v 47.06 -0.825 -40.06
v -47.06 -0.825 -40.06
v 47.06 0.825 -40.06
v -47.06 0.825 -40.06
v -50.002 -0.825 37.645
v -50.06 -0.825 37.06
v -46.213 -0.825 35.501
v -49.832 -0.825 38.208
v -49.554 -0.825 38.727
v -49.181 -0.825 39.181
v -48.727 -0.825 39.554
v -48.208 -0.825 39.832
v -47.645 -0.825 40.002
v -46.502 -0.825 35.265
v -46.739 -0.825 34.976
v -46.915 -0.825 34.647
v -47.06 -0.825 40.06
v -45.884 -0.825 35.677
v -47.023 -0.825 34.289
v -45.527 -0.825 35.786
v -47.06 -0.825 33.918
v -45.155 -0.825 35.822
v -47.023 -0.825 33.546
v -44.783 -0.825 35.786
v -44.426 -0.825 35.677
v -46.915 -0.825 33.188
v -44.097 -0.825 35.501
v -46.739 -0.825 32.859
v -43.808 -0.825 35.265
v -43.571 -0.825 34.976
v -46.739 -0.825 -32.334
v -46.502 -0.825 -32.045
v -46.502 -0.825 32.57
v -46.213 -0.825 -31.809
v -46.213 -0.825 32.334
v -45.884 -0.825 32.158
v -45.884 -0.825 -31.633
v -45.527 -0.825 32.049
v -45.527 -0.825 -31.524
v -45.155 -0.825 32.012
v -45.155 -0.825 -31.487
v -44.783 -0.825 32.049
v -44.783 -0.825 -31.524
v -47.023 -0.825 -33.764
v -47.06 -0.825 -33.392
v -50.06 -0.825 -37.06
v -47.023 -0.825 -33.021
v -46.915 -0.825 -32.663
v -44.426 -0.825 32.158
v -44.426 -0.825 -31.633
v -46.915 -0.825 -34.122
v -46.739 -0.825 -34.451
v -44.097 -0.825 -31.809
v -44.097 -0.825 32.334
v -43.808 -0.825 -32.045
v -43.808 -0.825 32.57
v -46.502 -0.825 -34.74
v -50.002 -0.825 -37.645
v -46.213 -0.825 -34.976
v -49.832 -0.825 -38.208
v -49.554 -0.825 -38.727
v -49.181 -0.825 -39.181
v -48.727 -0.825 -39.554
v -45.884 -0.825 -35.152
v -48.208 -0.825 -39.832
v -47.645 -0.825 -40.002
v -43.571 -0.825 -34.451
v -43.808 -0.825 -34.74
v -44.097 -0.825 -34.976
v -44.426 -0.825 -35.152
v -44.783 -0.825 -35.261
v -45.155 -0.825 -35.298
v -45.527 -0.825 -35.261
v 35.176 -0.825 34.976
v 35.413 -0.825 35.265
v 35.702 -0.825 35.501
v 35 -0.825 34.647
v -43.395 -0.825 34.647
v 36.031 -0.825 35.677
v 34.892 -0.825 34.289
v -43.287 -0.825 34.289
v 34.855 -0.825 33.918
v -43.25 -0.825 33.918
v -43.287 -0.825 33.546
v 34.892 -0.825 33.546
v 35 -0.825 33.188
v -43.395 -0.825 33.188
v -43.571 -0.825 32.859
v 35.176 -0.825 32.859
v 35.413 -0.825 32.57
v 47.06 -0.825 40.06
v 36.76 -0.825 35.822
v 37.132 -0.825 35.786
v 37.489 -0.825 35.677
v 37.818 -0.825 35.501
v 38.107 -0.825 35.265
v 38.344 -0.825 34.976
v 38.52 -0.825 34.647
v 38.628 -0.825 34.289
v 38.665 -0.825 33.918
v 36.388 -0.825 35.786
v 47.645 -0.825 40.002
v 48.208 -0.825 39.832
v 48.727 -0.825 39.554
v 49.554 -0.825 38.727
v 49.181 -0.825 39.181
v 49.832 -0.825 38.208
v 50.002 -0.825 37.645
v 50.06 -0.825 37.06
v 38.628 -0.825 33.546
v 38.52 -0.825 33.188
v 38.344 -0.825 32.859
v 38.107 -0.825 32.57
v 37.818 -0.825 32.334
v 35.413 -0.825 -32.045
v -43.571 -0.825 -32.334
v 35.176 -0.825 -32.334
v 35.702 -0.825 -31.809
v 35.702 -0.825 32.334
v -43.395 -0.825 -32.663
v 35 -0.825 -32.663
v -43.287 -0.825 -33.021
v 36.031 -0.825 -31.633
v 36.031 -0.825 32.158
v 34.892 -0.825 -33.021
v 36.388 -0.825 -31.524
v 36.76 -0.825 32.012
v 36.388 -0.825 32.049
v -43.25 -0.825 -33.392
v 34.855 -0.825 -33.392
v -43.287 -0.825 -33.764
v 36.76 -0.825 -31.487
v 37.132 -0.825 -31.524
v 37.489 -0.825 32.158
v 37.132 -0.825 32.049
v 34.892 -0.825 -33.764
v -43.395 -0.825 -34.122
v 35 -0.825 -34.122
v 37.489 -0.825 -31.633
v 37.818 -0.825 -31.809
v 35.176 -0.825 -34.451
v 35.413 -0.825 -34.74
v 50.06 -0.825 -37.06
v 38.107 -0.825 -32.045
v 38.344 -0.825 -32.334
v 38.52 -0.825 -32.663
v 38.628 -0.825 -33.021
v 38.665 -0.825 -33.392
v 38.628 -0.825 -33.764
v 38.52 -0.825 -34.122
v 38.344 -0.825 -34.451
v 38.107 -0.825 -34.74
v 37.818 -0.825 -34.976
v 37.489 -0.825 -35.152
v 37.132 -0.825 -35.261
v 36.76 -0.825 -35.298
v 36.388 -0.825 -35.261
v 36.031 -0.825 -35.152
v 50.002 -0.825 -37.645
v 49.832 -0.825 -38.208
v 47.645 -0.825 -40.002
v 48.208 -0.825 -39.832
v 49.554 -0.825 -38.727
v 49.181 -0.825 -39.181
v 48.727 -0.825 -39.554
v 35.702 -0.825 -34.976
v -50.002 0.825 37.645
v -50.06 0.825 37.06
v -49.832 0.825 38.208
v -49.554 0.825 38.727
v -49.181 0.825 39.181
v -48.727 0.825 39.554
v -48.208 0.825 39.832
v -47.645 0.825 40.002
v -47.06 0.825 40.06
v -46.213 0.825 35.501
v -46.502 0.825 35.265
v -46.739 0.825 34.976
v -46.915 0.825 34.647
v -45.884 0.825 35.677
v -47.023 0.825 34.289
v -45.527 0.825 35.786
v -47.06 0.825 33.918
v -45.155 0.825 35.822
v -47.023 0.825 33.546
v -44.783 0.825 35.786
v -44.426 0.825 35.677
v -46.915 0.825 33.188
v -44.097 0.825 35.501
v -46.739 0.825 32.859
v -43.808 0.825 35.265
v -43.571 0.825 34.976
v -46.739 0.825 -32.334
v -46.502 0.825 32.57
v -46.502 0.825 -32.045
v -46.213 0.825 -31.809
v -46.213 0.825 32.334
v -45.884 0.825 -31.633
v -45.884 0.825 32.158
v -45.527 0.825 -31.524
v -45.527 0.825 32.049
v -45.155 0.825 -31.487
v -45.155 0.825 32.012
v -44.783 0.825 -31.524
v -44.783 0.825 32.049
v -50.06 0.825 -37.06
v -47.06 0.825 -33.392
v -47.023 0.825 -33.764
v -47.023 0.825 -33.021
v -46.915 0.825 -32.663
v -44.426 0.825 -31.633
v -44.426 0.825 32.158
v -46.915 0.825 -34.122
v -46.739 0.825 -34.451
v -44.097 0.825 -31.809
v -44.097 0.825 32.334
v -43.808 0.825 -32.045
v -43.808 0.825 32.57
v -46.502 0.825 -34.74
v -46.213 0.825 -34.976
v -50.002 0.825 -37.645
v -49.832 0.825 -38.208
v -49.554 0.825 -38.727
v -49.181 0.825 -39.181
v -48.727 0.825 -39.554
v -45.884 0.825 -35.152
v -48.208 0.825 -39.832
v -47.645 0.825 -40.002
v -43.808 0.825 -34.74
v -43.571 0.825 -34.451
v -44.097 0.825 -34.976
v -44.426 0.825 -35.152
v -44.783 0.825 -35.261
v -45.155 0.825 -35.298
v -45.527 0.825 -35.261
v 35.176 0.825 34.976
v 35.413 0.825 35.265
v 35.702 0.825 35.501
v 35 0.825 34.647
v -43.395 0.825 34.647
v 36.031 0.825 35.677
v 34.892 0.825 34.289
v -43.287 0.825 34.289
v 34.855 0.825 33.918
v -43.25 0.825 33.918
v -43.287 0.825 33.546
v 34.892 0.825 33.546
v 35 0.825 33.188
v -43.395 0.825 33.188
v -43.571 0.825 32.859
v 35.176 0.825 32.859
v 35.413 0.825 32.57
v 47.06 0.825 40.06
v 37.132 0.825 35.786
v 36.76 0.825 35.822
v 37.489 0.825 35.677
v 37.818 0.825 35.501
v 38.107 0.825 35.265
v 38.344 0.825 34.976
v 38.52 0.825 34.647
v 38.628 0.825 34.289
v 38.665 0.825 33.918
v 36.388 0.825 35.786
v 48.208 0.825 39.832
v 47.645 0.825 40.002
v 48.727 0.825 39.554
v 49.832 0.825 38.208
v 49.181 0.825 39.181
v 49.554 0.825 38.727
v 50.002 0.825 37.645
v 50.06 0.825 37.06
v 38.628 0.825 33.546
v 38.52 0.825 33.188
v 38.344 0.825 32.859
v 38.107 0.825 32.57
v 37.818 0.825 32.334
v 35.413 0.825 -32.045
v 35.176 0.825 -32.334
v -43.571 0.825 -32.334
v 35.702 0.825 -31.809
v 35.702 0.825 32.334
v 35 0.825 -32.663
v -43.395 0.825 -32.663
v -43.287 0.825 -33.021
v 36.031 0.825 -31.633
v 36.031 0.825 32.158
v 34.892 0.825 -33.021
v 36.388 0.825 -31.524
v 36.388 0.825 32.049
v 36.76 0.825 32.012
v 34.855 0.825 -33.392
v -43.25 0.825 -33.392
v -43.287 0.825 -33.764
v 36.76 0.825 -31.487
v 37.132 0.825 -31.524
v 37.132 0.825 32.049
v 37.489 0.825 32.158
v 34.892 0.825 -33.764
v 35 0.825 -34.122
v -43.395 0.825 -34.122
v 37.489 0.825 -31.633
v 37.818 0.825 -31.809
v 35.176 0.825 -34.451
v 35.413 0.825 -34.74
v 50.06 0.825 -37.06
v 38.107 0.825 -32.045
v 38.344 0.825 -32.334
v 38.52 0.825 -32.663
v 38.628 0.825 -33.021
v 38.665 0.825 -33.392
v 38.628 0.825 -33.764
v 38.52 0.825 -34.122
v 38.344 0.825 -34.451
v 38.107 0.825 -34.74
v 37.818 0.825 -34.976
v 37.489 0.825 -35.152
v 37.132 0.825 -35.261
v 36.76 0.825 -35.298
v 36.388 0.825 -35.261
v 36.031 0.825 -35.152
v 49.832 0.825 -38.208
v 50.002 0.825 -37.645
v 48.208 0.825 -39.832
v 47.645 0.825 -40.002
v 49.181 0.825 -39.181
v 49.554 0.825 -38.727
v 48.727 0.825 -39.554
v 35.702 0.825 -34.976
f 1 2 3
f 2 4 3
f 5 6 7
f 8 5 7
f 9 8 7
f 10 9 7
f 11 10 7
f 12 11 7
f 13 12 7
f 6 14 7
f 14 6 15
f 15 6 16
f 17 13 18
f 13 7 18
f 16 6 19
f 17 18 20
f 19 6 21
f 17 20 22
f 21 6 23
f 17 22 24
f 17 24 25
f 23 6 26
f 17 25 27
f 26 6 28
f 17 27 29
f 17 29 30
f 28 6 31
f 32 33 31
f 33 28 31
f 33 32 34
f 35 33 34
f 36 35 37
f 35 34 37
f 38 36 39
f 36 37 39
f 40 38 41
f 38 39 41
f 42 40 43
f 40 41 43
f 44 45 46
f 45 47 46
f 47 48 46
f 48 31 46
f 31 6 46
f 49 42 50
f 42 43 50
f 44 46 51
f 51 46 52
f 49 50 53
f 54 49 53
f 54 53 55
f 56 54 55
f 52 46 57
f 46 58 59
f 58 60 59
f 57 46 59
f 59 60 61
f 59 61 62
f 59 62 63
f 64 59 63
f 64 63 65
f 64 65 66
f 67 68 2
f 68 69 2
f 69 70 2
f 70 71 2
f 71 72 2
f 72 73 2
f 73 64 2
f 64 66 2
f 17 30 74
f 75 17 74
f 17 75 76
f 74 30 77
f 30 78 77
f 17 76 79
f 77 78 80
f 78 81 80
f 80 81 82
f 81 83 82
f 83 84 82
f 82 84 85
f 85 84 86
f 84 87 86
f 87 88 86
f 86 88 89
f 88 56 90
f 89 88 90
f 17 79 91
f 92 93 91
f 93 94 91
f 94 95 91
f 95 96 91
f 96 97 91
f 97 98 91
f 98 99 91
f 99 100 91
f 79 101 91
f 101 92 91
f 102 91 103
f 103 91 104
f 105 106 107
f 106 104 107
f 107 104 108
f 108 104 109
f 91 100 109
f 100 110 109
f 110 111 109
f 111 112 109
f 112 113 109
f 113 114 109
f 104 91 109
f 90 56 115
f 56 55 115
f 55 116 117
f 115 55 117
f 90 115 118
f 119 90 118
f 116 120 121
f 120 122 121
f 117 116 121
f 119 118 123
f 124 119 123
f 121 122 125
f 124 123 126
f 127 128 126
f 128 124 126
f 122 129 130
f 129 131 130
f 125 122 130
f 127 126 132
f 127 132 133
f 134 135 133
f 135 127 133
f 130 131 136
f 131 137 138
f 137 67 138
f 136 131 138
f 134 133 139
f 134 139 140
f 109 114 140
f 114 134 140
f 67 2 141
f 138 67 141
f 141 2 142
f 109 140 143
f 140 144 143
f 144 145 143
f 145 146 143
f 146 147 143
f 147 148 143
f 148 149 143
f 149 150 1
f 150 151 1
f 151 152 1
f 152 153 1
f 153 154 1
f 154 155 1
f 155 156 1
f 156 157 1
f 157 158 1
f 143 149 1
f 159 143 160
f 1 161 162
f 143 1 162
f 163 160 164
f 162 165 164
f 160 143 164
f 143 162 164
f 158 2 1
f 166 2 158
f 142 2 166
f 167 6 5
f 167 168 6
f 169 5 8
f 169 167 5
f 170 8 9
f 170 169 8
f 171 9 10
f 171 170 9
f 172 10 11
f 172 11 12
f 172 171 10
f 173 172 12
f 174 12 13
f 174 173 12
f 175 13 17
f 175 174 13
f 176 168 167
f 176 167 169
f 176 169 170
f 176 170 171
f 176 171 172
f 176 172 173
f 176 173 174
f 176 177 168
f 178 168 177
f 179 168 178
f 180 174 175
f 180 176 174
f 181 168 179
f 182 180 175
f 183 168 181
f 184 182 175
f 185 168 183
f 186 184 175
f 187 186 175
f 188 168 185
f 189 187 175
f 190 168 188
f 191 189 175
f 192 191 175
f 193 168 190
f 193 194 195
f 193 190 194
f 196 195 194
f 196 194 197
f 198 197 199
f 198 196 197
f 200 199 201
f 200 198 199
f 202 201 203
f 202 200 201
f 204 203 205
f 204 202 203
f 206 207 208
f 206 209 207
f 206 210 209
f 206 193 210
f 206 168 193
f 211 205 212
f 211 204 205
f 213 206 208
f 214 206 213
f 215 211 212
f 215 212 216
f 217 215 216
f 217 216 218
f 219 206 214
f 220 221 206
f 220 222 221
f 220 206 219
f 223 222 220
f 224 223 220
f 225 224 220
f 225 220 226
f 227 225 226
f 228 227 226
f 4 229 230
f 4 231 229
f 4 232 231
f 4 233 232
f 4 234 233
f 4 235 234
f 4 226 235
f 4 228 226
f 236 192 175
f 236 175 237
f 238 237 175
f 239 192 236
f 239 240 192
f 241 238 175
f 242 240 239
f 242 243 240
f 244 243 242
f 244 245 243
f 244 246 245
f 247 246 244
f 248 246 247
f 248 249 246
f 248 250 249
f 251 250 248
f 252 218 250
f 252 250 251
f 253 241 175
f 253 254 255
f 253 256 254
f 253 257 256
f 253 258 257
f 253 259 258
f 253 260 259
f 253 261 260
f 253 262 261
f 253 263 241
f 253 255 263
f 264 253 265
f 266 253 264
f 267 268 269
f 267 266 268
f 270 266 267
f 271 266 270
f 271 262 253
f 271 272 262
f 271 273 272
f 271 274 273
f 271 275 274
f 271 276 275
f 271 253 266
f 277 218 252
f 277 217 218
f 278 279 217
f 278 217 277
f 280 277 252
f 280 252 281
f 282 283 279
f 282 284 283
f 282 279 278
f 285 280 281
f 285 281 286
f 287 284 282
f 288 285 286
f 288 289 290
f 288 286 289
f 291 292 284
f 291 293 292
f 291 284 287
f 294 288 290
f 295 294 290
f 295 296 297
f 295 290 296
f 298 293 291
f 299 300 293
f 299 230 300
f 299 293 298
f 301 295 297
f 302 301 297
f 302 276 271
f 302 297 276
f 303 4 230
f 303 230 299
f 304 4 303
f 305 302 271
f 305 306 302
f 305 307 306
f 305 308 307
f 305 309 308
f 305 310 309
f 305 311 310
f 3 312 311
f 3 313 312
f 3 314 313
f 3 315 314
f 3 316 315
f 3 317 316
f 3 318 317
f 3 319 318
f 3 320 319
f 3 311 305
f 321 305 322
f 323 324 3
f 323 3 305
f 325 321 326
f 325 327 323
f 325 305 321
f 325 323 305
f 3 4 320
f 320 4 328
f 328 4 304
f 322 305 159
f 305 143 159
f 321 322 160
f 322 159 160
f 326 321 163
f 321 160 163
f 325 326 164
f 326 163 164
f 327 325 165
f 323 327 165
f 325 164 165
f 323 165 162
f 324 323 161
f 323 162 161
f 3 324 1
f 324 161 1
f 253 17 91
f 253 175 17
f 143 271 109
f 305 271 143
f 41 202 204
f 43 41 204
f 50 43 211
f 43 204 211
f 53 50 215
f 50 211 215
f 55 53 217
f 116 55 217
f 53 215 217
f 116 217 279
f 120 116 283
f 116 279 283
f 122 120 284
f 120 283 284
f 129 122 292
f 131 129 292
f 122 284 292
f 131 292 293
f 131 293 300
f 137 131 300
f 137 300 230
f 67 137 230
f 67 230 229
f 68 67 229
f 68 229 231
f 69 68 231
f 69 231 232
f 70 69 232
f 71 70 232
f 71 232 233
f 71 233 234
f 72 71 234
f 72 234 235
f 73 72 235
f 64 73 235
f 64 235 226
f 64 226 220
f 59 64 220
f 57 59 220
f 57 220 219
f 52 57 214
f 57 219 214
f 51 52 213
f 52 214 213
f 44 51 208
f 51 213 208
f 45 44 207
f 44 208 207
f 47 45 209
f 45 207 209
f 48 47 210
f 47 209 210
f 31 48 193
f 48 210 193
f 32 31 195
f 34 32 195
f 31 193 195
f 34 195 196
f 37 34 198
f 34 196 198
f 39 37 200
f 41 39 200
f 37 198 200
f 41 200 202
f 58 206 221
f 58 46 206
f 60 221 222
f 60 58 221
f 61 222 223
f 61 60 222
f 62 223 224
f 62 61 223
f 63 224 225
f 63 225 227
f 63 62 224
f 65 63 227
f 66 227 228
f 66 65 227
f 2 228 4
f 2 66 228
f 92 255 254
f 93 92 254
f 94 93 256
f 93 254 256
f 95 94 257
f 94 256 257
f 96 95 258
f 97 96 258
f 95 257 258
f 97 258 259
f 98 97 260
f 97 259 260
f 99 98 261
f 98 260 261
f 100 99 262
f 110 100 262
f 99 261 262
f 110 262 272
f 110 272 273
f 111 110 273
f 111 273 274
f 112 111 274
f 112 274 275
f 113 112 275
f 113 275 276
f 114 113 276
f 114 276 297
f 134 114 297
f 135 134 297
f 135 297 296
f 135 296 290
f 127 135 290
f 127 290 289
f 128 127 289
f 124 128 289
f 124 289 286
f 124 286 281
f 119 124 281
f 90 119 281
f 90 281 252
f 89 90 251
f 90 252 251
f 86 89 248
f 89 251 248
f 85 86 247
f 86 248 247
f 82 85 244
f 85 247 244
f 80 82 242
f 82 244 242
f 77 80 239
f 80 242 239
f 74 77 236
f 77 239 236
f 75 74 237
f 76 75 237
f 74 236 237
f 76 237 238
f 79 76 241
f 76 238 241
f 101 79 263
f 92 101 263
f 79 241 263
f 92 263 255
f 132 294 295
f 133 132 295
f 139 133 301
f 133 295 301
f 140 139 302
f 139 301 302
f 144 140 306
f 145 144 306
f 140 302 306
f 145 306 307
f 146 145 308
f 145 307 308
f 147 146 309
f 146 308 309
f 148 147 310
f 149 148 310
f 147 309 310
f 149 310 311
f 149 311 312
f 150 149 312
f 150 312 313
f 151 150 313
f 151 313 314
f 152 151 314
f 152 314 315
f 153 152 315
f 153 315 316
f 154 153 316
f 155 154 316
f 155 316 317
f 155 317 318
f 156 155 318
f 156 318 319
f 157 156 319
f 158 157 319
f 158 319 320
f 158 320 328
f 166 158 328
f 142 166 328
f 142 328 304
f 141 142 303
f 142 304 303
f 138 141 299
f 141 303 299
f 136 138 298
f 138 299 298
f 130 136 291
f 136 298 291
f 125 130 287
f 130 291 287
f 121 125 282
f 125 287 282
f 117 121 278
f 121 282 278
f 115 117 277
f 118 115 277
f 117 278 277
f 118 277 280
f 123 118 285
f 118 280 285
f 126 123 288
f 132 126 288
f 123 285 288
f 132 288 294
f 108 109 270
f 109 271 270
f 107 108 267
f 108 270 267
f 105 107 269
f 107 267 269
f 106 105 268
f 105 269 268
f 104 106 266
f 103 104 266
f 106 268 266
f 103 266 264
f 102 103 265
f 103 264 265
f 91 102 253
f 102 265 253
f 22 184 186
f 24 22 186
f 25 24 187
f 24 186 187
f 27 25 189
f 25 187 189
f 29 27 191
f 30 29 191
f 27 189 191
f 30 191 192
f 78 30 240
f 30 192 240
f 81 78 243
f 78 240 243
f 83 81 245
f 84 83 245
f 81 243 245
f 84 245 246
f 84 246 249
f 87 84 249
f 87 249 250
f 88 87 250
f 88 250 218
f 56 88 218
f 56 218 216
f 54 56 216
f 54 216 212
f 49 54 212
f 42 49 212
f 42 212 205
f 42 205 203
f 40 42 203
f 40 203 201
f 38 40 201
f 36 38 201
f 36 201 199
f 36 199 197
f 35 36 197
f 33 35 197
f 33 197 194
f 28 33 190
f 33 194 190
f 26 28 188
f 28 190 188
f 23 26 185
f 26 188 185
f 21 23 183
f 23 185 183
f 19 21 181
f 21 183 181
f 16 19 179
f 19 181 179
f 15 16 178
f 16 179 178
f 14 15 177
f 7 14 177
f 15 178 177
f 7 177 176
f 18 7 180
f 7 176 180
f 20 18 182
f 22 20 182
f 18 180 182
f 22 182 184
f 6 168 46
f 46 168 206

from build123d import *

# Parameters (mm, degrees)
SKETCH1_W           = 100.12
SKETCH1_H           = 80.12
BOSS_EXTRUDE1_DEPTH = 0.825
FILLET1_R           = 3
CUT_EXTRUDE1_REACH  = 66.137
SKETCH2_R           = 1.905


with BuildPart() as part:
    # Sketch1 → Boss-Extrude1 (new, symmetric)
    with BuildSketch(Plane(origin=(0, 0, 0), x_dir=(1, 0, 0), z_dir=(0, 1, 0))):
        Rectangle(SKETCH1_W, SKETCH1_H)
    extrude(amount=BOSS_EXTRUDE1_DEPTH, both=True)

    # Fillet1
    fillet1_edges = [part.edges().sort_by_distance(p)[0] for p in [
        (-50.06, 0, -40.06),
        (50.06, 0, -40.06),
        (50.06, 0, 40.06),
        (-50.06, 0, 40.06),
    ]]
    fillet(fillet1_edges, radius=FILLET1_R)

    # Sketch2 → Cut-Extrude1 (cut, up to next)
    with BuildSketch(Plane(origin=(0, 0.825, 0), x_dir=(1, 0, 0), z_dir=(0, 1, 0)), mode=Mode.PRIVATE) as cut_extrude1_sk1:
        with Locations(Location((-45.155, 33.3925, 0), (0, 0, 270))):
            Circle(SKETCH2_R)
    cut_extrude1_tool1 = extrude(cut_extrude1_sk1.sketch, amount=-CUT_EXTRUDE1_REACH, mode=Mode.PRIVATE) & part.part
    # Sketch2 → Cut-Extrude1 (cut, up to next)
    with BuildSketch(Plane(origin=(0, 0.825, 0), x_dir=(1, 0, 0), z_dir=(0, 1, 0)), mode=Mode.PRIVATE) as cut_extrude1_sk2:
        with Locations(Location((-45.155, -33.9175, 0), (0, 0, 270))):
            Circle(SKETCH2_R)
    cut_extrude1_tool2 = extrude(cut_extrude1_sk2.sketch, amount=-CUT_EXTRUDE1_REACH, mode=Mode.PRIVATE) & part.part
    # Sketch2 → Cut-Extrude1 (cut, up to next)
    with BuildSketch(Plane(origin=(0, 0.825, 0), x_dir=(1, 0, 0), z_dir=(0, 1, 0)), mode=Mode.PRIVATE) as cut_extrude1_sk3:
        with Locations(Location((36.76, -33.9175, 0), (0, 0, 270))):
            Circle(SKETCH2_R)
    cut_extrude1_tool3 = extrude(cut_extrude1_sk3.sketch, amount=-CUT_EXTRUDE1_REACH, mode=Mode.PRIVATE) & part.part
    # Sketch2 → Cut-Extrude1 (cut, up to next)
    with BuildSketch(Plane(origin=(0, 0.825, 0), x_dir=(1, 0, 0), z_dir=(0, 1, 0)), mode=Mode.PRIVATE) as cut_extrude1_sk4:
        with Locations(Location((36.76, 33.3925, 0), (0, 0, 270))):
            Circle(SKETCH2_R)
    cut_extrude1_tool4 = extrude(cut_extrude1_sk4.sketch, amount=-CUT_EXTRUDE1_REACH, mode=Mode.PRIVATE) & part.part
    add(cut_extrude1_tool1.solids().sort_by_distance((-45.155, 0.825, -33.3925))[0], mode=Mode.SUBTRACT)
    add(cut_extrude1_tool2.solids().sort_by_distance((-45.155, 0.825, 33.9175))[0], mode=Mode.SUBTRACT)
    add(cut_extrude1_tool3.solids().sort_by_distance((36.76, 0.825, 33.9175))[0], mode=Mode.SUBTRACT)
    add(cut_extrude1_tool4.solids().sort_by_distance((36.76, 0.825, -33.3925))[0], mode=Mode.SUBTRACT)


solid = part.part
